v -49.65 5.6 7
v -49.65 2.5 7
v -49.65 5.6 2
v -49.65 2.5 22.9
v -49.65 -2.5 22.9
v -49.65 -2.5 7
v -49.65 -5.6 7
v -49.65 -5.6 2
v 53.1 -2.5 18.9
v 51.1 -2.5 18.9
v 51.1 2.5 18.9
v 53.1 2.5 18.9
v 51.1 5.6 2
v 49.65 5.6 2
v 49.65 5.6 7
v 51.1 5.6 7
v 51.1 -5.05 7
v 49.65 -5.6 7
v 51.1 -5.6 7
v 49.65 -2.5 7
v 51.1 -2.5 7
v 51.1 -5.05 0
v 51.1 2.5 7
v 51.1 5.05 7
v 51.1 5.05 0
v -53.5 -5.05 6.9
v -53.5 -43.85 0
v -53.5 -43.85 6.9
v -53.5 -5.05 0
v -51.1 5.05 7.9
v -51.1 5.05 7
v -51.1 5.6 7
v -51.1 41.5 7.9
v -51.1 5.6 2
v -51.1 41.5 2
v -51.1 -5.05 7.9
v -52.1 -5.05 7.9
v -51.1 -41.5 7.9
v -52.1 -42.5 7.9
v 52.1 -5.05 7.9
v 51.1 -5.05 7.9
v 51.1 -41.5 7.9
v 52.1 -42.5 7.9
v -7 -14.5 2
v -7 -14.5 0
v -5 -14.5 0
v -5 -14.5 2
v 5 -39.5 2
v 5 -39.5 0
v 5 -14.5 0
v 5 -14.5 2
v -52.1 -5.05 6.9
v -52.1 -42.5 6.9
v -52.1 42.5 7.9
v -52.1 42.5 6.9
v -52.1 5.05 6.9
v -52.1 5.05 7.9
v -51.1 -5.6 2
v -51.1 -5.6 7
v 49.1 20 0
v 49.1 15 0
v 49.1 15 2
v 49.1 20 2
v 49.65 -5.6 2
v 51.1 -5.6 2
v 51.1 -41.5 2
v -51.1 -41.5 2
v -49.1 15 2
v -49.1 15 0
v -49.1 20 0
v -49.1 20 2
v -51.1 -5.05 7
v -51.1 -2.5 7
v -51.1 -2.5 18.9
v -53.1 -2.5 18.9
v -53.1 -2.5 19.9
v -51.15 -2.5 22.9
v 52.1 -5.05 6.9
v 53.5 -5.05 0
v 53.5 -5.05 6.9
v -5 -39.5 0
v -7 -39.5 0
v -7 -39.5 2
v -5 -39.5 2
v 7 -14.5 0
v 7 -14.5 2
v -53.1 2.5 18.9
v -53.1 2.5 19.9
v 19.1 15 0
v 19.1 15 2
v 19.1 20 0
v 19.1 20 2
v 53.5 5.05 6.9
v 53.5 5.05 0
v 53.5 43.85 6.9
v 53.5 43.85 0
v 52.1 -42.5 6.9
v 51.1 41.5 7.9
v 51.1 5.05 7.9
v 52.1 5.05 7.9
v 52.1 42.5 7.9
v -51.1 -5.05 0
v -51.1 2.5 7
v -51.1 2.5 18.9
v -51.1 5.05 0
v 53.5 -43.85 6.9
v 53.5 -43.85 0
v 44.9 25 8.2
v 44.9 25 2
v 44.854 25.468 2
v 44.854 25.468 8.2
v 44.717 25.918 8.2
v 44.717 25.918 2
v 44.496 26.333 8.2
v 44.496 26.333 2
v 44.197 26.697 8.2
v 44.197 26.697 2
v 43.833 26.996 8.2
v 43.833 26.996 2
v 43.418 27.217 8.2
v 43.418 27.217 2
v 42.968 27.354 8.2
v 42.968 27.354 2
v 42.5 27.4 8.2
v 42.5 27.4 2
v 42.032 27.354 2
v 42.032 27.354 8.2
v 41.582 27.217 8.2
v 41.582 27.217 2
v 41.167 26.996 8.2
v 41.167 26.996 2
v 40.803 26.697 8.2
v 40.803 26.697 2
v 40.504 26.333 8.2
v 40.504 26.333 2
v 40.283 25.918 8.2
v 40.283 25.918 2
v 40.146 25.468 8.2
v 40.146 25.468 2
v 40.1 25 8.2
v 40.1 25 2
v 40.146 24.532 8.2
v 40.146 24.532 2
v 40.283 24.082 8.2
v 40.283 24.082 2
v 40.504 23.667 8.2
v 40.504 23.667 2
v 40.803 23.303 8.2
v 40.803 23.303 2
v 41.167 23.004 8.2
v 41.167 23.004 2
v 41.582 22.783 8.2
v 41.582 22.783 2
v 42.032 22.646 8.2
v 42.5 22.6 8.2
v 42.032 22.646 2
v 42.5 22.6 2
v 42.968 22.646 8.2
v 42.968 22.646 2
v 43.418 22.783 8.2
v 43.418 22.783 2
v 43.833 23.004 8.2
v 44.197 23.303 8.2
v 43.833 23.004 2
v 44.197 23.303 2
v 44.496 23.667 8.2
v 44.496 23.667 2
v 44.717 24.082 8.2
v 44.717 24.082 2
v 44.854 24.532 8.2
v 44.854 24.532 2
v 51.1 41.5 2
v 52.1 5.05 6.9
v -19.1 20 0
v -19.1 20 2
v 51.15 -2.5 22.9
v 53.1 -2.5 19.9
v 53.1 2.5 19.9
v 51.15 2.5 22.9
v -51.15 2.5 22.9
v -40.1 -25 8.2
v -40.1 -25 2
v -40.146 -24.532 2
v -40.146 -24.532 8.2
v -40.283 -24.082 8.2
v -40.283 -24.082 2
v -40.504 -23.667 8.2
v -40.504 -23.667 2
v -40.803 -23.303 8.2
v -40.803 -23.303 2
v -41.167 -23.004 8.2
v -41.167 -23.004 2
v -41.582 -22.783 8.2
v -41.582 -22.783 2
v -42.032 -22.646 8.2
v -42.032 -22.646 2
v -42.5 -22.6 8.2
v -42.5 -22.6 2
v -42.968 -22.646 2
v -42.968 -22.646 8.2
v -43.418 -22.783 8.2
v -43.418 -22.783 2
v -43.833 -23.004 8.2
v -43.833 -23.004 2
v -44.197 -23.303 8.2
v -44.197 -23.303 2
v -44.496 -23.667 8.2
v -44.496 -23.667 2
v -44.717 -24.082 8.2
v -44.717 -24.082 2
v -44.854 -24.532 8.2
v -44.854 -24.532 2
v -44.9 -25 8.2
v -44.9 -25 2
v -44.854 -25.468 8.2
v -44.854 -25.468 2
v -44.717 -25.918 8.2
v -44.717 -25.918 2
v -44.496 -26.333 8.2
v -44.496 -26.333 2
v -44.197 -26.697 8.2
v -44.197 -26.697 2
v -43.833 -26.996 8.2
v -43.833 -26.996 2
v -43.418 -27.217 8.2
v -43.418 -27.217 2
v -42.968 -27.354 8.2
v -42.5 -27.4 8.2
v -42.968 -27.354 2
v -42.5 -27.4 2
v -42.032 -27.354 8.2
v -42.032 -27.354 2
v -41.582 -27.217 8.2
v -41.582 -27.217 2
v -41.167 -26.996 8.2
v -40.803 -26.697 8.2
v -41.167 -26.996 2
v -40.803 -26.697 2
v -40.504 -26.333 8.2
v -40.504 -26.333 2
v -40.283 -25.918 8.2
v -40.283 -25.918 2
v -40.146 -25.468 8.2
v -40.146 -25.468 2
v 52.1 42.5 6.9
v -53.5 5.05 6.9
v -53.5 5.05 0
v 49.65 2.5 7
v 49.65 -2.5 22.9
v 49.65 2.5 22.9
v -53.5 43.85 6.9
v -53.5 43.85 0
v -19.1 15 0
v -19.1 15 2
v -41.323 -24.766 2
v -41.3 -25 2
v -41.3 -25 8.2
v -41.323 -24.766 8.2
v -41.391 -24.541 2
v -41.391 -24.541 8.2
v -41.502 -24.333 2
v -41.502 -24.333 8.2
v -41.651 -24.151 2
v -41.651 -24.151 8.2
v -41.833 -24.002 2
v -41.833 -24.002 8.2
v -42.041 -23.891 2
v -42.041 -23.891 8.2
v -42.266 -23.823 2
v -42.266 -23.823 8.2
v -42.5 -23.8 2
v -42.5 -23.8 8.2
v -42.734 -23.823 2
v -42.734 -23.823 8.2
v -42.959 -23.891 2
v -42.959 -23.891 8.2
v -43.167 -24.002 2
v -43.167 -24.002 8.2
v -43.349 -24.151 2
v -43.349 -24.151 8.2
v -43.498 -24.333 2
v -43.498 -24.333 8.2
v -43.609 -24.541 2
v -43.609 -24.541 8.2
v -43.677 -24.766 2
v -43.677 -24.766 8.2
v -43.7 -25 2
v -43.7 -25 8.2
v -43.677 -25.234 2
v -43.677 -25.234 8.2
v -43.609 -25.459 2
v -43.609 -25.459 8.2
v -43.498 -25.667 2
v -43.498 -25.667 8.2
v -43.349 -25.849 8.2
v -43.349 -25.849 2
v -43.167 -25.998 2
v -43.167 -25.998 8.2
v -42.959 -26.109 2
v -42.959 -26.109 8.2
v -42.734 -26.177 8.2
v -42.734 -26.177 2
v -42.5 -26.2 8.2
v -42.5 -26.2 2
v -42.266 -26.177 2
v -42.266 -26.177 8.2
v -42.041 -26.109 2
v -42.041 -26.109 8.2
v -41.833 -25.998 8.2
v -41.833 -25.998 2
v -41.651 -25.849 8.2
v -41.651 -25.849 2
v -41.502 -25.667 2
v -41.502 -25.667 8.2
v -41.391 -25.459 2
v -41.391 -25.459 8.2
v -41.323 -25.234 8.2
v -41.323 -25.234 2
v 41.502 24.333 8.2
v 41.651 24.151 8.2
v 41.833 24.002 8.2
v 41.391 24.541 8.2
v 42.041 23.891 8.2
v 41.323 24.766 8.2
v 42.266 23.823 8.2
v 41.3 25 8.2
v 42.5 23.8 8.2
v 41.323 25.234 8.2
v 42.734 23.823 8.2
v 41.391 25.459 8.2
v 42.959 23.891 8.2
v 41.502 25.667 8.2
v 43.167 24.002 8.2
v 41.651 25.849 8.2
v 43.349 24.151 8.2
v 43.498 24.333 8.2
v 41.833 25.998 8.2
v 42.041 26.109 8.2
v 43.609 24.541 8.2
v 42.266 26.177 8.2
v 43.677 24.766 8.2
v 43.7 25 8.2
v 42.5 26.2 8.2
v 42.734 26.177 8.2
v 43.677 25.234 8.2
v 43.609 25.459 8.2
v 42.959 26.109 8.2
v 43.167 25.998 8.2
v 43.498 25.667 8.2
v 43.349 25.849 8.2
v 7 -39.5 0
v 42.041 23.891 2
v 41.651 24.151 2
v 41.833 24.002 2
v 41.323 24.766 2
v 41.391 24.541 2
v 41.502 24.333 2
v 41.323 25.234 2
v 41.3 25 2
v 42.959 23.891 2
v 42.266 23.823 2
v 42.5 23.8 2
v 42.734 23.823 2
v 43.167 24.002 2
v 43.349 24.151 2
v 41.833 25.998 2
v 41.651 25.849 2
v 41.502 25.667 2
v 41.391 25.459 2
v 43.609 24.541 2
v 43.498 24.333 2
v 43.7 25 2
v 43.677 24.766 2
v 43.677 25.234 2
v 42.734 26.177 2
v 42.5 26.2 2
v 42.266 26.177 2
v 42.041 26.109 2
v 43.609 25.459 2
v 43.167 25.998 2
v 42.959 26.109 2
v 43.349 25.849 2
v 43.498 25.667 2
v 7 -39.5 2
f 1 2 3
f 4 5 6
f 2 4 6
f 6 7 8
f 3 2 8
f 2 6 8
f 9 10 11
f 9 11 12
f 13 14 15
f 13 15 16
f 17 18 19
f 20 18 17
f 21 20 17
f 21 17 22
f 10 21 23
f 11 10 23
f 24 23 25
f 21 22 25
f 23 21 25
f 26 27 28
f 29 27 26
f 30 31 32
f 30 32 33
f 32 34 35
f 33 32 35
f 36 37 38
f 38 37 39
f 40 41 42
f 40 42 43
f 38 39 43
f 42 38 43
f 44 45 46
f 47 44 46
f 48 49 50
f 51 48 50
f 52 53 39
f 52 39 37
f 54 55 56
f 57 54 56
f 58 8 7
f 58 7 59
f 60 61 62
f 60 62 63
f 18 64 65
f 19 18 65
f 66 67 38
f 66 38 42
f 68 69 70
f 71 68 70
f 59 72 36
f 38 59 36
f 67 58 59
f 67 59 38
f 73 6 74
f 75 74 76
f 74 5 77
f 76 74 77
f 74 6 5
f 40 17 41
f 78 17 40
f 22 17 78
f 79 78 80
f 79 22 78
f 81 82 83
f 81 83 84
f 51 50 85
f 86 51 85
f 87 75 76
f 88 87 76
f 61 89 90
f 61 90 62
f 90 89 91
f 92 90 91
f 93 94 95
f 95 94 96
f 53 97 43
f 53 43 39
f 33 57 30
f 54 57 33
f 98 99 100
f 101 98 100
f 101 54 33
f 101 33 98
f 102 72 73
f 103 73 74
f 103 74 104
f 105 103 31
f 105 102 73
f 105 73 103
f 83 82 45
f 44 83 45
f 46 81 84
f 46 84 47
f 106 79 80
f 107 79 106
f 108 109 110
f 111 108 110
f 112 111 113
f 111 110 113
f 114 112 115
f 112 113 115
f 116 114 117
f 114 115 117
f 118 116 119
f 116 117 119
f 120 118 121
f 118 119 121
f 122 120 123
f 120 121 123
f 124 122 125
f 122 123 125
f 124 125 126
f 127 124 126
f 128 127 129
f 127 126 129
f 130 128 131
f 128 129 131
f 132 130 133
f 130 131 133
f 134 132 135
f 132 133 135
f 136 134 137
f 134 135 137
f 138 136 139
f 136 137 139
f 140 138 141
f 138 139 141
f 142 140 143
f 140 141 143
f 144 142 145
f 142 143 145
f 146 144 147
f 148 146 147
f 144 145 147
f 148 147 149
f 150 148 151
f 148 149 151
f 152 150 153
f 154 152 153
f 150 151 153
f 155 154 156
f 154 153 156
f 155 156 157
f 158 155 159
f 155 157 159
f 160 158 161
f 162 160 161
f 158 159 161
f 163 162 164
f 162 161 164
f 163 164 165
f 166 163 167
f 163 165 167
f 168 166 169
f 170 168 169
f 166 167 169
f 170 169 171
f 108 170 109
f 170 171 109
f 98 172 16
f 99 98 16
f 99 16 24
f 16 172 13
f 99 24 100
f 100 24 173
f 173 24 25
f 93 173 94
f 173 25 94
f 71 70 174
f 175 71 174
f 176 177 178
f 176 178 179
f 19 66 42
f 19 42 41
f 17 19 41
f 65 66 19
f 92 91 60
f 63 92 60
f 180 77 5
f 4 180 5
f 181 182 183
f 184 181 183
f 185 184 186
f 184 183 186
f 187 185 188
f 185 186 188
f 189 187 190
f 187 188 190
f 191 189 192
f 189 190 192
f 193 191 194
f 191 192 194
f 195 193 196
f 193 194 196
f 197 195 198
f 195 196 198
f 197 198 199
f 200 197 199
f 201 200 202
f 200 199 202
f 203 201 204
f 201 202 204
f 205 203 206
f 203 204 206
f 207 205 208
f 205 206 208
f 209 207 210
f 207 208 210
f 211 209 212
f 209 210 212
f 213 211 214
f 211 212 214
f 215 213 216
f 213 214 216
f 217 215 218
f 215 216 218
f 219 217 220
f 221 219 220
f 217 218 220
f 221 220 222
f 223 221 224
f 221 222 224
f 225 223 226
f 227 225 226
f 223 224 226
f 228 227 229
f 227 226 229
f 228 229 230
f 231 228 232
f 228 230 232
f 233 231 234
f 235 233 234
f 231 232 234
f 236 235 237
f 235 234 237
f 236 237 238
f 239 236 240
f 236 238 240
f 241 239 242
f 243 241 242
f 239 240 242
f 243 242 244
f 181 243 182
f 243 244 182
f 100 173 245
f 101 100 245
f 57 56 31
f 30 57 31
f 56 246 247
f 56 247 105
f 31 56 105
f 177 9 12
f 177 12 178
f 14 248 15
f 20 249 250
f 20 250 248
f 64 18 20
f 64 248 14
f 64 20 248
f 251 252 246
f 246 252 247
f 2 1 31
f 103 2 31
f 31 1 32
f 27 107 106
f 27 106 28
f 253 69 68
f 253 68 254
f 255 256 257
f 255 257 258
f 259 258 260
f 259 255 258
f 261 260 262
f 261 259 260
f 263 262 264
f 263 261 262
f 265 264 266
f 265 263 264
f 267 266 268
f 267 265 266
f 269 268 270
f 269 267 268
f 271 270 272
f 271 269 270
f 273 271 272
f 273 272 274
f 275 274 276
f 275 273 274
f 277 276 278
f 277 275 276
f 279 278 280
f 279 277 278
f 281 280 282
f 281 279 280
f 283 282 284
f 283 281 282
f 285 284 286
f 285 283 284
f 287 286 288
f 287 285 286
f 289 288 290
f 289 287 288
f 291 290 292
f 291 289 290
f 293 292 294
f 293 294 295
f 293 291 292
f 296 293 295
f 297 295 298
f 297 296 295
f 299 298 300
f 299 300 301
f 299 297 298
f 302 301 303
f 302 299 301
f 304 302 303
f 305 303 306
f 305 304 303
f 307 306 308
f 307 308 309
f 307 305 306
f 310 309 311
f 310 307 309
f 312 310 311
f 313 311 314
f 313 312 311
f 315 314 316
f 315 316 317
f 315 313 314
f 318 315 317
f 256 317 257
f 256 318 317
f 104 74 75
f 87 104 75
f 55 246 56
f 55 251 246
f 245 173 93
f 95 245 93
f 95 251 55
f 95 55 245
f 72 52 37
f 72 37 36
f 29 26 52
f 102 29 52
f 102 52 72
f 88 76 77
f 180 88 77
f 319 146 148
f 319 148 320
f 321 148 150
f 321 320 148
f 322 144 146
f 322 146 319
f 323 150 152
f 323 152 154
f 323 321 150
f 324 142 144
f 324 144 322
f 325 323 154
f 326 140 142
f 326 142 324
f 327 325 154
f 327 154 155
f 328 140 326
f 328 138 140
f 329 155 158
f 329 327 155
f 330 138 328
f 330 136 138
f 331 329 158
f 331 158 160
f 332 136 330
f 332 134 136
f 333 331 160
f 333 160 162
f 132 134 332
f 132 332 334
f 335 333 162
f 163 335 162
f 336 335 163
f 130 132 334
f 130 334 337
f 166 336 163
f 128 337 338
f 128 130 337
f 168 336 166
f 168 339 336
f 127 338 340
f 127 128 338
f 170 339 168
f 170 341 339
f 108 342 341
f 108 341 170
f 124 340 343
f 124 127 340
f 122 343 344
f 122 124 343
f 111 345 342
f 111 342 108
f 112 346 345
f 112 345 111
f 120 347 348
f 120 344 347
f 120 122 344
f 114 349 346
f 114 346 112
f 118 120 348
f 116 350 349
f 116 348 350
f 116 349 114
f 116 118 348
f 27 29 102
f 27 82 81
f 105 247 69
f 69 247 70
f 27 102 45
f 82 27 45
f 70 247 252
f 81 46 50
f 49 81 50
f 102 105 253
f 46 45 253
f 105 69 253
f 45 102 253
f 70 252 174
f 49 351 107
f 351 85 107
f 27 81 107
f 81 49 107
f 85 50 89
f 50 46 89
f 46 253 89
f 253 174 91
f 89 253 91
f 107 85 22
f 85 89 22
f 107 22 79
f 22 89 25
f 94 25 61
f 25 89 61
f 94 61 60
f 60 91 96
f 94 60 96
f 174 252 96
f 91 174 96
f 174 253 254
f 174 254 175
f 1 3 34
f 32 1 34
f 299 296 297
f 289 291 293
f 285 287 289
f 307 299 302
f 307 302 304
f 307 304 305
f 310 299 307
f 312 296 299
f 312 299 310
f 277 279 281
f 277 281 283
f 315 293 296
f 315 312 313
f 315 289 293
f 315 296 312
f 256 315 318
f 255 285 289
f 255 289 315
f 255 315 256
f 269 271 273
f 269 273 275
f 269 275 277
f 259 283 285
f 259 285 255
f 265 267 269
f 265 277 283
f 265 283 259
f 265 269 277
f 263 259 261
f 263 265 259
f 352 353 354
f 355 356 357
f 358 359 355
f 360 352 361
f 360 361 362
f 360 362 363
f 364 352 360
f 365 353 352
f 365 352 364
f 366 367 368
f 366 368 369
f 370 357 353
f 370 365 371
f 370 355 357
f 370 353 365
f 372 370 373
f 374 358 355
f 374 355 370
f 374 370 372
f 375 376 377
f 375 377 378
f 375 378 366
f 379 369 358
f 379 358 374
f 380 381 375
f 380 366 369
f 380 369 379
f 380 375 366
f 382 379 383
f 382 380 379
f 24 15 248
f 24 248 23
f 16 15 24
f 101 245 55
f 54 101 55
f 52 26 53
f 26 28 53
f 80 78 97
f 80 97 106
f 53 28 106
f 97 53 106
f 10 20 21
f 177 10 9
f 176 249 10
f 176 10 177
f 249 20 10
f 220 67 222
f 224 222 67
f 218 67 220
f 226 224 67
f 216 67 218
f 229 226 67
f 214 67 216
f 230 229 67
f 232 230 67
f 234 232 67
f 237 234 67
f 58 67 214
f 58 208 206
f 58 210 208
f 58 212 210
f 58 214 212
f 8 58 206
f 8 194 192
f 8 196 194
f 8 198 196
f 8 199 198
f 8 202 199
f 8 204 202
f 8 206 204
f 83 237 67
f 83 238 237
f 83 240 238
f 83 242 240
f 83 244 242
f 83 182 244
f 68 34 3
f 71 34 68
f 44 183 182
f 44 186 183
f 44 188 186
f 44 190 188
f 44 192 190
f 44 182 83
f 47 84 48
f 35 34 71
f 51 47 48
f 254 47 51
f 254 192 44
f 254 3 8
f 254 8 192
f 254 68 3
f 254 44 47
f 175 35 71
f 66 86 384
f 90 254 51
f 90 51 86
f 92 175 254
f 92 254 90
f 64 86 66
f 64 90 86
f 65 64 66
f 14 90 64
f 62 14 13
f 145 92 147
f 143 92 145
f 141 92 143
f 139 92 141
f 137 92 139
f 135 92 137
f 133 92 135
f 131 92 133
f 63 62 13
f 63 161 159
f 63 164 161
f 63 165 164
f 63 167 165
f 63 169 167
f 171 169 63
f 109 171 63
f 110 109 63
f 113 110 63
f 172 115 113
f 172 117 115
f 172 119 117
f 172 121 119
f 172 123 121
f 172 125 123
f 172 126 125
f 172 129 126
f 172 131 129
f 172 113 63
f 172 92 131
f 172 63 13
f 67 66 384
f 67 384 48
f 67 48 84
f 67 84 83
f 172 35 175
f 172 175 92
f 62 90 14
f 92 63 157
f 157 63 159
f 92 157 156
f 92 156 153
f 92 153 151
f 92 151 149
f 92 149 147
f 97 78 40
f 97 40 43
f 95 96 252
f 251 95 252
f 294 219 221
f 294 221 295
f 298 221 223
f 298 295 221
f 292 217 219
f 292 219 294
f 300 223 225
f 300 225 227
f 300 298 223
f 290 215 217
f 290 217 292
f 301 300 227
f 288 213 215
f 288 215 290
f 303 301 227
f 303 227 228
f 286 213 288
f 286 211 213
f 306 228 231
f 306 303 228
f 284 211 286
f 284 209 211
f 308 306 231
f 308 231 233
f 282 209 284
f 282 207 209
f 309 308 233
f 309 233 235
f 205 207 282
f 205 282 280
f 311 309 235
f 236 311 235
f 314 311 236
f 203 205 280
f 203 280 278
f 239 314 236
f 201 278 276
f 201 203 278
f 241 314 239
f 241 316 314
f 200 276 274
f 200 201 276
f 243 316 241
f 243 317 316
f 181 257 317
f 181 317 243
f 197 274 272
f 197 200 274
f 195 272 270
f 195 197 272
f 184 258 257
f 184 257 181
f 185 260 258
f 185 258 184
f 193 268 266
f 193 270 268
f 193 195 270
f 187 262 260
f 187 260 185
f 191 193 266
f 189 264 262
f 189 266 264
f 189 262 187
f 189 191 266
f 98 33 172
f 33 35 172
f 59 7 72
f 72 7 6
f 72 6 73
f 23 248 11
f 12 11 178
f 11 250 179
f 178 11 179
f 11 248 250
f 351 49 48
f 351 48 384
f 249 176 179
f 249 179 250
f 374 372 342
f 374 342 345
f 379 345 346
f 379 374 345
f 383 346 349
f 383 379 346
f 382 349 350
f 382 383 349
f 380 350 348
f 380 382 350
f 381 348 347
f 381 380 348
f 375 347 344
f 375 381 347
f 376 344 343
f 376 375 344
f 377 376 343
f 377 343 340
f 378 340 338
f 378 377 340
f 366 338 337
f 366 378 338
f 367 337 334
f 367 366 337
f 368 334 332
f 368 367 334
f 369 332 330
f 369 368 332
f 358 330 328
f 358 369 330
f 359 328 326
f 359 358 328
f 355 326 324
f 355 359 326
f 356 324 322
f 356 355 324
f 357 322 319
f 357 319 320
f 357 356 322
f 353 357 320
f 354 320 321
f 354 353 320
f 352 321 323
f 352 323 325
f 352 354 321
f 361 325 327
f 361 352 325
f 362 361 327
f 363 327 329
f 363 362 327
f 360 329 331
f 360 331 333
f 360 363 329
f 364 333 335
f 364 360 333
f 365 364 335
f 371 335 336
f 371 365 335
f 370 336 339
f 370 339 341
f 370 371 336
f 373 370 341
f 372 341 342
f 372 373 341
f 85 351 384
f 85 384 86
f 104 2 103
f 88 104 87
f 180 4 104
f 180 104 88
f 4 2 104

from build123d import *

# Parameters (mm, degrees)
SKETCH_W      = 102.2
SKETCH_H      = 83
SKETCH_W_2    = 30
SKETCH_H_2    = 5
SKETCH_W_3    = 2
SKETCH_H_3    = 25
PAD_DEPTH     = 2
SKETCH001_R   = 2.4
SKETCH001_R_2 = 1.2
PAD001_DEPTH  = 6.2
PAD002_DEPTH  = 6.9
PAD003_DEPTH  = 1
SKETCH004_W   = 1.45
SKETCH004_H   = 11.2
PAD004_DEPTH  = 5
SKETCH005_W   = 1.45
SKETCH005_H   = 5
PAD005_DEPTH  = 11.9
PAD006_DEPTH  = 5


with BuildPart() as part:
    # Sketch → Pad (new body)
    with BuildSketch(Plane.XY):
        Rectangle(SKETCH_W, SKETCH_H)
        with Locations((34.1, 17.5)):
            Rectangle(SKETCH_W_2, SKETCH_H_2, mode=Mode.SUBTRACT)
        with Locations((-34.1, 17.5)):
            Rectangle(SKETCH_W_2, SKETCH_H_2, mode=Mode.SUBTRACT)
        with Locations((6, -27)):
            Rectangle(SKETCH_W_3, SKETCH_H_3, mode=Mode.SUBTRACT)
        with Locations((-6, -27)):
            Rectangle(SKETCH_W_3, SKETCH_H_3, mode=Mode.SUBTRACT)
    extrude(amount=PAD_DEPTH)

    # Sketch001 (on Face22 of Pad) → Pad001 (join)
    with BuildSketch(Plane.XY.offset(2)):
        with Locations((-42.5, -25)):
            Circle(SKETCH001_R)
        with Locations((-42.5, -25)):
            Circle(SKETCH001_R_2, mode=Mode.SUBTRACT)
        with Locations((42.5, 25)):
            Circle(SKETCH001_R)
        with Locations((42.5, 25)):
            Circle(SKETCH001_R_2, mode=Mode.SUBTRACT)
    extrude(amount=PAD001_DEPTH)

    # Sketch002 → Pad002 (join)
    with BuildSketch(Plane.XY):
        Polygon((-51.1, 41.5), (51.1, 41.5), (51.1, 5.05), (53.5, 5.05), (53.5, 43.85), (-53.5, 43.85), (-53.5, 5.05), (-51.1, 5.05), align=None)
    pad002 = extrude(amount=PAD002_DEPTH)

    # Mirrored: Pad002 across XZ
    add(pad002.mirror(Plane.XZ))

    # Sketch003 (on Face36 of Mirrored) → Pad003 (join)
    with BuildSketch(Plane.XY.offset(6.9)):
        Polygon((-51.1, 5.05), (-51.1, 41.5), (51.1, 41.5), (51.1, 5.05), (52.1, 5.05), (52.1, 42.5), (-52.1, 42.5), (-52.1, 5.05), align=None)
    pad003 = extrude(amount=PAD003_DEPTH)

    # Mirrored001: Pad003 across XZ
    add(pad003.mirror(Plane.XZ))

    # Sketch004 (on Face3 of Mirrored001) → Pad004 (join)
    with BuildSketch(Plane.XY.offset(2)):
        with Locations((50.375, 0)):
            Rectangle(SKETCH004_W, SKETCH004_H)
    pad004 = extrude(amount=PAD004_DEPTH)

    # Mirrored002: Pad004 across YZ
    add(pad004.mirror(Plane.YZ))

    # Sketch005 (on Face40 of Mirrored002) → Pad005 (join)
    with BuildSketch(Plane.XY.offset(7)):
        with Locations((50.375, 0)):
            Rectangle(SKETCH005_W, SKETCH005_H)
    pad005 = extrude(amount=PAD005_DEPTH)

    # Mirrored003: Pad005 across YZ
    add(pad005.mirror(Plane.YZ))

    # Sketch006 (on Face2 of Mirrored003) → Pad006 (join)
    with BuildSketch(Plane.XZ.offset(2.5)):
        Polygon((49.65, 18.9), (51.1, 18.9), (53.1, 18.9), (53.1, 19.9), (51.15, 22.9), (49.65, 22.9), align=None)
    pad006 = extrude(amount=-PAD006_DEPTH)

    # Mirrored004: Pad006 across YZ
    add(pad006.mirror(Plane.YZ))


solid = part.part
